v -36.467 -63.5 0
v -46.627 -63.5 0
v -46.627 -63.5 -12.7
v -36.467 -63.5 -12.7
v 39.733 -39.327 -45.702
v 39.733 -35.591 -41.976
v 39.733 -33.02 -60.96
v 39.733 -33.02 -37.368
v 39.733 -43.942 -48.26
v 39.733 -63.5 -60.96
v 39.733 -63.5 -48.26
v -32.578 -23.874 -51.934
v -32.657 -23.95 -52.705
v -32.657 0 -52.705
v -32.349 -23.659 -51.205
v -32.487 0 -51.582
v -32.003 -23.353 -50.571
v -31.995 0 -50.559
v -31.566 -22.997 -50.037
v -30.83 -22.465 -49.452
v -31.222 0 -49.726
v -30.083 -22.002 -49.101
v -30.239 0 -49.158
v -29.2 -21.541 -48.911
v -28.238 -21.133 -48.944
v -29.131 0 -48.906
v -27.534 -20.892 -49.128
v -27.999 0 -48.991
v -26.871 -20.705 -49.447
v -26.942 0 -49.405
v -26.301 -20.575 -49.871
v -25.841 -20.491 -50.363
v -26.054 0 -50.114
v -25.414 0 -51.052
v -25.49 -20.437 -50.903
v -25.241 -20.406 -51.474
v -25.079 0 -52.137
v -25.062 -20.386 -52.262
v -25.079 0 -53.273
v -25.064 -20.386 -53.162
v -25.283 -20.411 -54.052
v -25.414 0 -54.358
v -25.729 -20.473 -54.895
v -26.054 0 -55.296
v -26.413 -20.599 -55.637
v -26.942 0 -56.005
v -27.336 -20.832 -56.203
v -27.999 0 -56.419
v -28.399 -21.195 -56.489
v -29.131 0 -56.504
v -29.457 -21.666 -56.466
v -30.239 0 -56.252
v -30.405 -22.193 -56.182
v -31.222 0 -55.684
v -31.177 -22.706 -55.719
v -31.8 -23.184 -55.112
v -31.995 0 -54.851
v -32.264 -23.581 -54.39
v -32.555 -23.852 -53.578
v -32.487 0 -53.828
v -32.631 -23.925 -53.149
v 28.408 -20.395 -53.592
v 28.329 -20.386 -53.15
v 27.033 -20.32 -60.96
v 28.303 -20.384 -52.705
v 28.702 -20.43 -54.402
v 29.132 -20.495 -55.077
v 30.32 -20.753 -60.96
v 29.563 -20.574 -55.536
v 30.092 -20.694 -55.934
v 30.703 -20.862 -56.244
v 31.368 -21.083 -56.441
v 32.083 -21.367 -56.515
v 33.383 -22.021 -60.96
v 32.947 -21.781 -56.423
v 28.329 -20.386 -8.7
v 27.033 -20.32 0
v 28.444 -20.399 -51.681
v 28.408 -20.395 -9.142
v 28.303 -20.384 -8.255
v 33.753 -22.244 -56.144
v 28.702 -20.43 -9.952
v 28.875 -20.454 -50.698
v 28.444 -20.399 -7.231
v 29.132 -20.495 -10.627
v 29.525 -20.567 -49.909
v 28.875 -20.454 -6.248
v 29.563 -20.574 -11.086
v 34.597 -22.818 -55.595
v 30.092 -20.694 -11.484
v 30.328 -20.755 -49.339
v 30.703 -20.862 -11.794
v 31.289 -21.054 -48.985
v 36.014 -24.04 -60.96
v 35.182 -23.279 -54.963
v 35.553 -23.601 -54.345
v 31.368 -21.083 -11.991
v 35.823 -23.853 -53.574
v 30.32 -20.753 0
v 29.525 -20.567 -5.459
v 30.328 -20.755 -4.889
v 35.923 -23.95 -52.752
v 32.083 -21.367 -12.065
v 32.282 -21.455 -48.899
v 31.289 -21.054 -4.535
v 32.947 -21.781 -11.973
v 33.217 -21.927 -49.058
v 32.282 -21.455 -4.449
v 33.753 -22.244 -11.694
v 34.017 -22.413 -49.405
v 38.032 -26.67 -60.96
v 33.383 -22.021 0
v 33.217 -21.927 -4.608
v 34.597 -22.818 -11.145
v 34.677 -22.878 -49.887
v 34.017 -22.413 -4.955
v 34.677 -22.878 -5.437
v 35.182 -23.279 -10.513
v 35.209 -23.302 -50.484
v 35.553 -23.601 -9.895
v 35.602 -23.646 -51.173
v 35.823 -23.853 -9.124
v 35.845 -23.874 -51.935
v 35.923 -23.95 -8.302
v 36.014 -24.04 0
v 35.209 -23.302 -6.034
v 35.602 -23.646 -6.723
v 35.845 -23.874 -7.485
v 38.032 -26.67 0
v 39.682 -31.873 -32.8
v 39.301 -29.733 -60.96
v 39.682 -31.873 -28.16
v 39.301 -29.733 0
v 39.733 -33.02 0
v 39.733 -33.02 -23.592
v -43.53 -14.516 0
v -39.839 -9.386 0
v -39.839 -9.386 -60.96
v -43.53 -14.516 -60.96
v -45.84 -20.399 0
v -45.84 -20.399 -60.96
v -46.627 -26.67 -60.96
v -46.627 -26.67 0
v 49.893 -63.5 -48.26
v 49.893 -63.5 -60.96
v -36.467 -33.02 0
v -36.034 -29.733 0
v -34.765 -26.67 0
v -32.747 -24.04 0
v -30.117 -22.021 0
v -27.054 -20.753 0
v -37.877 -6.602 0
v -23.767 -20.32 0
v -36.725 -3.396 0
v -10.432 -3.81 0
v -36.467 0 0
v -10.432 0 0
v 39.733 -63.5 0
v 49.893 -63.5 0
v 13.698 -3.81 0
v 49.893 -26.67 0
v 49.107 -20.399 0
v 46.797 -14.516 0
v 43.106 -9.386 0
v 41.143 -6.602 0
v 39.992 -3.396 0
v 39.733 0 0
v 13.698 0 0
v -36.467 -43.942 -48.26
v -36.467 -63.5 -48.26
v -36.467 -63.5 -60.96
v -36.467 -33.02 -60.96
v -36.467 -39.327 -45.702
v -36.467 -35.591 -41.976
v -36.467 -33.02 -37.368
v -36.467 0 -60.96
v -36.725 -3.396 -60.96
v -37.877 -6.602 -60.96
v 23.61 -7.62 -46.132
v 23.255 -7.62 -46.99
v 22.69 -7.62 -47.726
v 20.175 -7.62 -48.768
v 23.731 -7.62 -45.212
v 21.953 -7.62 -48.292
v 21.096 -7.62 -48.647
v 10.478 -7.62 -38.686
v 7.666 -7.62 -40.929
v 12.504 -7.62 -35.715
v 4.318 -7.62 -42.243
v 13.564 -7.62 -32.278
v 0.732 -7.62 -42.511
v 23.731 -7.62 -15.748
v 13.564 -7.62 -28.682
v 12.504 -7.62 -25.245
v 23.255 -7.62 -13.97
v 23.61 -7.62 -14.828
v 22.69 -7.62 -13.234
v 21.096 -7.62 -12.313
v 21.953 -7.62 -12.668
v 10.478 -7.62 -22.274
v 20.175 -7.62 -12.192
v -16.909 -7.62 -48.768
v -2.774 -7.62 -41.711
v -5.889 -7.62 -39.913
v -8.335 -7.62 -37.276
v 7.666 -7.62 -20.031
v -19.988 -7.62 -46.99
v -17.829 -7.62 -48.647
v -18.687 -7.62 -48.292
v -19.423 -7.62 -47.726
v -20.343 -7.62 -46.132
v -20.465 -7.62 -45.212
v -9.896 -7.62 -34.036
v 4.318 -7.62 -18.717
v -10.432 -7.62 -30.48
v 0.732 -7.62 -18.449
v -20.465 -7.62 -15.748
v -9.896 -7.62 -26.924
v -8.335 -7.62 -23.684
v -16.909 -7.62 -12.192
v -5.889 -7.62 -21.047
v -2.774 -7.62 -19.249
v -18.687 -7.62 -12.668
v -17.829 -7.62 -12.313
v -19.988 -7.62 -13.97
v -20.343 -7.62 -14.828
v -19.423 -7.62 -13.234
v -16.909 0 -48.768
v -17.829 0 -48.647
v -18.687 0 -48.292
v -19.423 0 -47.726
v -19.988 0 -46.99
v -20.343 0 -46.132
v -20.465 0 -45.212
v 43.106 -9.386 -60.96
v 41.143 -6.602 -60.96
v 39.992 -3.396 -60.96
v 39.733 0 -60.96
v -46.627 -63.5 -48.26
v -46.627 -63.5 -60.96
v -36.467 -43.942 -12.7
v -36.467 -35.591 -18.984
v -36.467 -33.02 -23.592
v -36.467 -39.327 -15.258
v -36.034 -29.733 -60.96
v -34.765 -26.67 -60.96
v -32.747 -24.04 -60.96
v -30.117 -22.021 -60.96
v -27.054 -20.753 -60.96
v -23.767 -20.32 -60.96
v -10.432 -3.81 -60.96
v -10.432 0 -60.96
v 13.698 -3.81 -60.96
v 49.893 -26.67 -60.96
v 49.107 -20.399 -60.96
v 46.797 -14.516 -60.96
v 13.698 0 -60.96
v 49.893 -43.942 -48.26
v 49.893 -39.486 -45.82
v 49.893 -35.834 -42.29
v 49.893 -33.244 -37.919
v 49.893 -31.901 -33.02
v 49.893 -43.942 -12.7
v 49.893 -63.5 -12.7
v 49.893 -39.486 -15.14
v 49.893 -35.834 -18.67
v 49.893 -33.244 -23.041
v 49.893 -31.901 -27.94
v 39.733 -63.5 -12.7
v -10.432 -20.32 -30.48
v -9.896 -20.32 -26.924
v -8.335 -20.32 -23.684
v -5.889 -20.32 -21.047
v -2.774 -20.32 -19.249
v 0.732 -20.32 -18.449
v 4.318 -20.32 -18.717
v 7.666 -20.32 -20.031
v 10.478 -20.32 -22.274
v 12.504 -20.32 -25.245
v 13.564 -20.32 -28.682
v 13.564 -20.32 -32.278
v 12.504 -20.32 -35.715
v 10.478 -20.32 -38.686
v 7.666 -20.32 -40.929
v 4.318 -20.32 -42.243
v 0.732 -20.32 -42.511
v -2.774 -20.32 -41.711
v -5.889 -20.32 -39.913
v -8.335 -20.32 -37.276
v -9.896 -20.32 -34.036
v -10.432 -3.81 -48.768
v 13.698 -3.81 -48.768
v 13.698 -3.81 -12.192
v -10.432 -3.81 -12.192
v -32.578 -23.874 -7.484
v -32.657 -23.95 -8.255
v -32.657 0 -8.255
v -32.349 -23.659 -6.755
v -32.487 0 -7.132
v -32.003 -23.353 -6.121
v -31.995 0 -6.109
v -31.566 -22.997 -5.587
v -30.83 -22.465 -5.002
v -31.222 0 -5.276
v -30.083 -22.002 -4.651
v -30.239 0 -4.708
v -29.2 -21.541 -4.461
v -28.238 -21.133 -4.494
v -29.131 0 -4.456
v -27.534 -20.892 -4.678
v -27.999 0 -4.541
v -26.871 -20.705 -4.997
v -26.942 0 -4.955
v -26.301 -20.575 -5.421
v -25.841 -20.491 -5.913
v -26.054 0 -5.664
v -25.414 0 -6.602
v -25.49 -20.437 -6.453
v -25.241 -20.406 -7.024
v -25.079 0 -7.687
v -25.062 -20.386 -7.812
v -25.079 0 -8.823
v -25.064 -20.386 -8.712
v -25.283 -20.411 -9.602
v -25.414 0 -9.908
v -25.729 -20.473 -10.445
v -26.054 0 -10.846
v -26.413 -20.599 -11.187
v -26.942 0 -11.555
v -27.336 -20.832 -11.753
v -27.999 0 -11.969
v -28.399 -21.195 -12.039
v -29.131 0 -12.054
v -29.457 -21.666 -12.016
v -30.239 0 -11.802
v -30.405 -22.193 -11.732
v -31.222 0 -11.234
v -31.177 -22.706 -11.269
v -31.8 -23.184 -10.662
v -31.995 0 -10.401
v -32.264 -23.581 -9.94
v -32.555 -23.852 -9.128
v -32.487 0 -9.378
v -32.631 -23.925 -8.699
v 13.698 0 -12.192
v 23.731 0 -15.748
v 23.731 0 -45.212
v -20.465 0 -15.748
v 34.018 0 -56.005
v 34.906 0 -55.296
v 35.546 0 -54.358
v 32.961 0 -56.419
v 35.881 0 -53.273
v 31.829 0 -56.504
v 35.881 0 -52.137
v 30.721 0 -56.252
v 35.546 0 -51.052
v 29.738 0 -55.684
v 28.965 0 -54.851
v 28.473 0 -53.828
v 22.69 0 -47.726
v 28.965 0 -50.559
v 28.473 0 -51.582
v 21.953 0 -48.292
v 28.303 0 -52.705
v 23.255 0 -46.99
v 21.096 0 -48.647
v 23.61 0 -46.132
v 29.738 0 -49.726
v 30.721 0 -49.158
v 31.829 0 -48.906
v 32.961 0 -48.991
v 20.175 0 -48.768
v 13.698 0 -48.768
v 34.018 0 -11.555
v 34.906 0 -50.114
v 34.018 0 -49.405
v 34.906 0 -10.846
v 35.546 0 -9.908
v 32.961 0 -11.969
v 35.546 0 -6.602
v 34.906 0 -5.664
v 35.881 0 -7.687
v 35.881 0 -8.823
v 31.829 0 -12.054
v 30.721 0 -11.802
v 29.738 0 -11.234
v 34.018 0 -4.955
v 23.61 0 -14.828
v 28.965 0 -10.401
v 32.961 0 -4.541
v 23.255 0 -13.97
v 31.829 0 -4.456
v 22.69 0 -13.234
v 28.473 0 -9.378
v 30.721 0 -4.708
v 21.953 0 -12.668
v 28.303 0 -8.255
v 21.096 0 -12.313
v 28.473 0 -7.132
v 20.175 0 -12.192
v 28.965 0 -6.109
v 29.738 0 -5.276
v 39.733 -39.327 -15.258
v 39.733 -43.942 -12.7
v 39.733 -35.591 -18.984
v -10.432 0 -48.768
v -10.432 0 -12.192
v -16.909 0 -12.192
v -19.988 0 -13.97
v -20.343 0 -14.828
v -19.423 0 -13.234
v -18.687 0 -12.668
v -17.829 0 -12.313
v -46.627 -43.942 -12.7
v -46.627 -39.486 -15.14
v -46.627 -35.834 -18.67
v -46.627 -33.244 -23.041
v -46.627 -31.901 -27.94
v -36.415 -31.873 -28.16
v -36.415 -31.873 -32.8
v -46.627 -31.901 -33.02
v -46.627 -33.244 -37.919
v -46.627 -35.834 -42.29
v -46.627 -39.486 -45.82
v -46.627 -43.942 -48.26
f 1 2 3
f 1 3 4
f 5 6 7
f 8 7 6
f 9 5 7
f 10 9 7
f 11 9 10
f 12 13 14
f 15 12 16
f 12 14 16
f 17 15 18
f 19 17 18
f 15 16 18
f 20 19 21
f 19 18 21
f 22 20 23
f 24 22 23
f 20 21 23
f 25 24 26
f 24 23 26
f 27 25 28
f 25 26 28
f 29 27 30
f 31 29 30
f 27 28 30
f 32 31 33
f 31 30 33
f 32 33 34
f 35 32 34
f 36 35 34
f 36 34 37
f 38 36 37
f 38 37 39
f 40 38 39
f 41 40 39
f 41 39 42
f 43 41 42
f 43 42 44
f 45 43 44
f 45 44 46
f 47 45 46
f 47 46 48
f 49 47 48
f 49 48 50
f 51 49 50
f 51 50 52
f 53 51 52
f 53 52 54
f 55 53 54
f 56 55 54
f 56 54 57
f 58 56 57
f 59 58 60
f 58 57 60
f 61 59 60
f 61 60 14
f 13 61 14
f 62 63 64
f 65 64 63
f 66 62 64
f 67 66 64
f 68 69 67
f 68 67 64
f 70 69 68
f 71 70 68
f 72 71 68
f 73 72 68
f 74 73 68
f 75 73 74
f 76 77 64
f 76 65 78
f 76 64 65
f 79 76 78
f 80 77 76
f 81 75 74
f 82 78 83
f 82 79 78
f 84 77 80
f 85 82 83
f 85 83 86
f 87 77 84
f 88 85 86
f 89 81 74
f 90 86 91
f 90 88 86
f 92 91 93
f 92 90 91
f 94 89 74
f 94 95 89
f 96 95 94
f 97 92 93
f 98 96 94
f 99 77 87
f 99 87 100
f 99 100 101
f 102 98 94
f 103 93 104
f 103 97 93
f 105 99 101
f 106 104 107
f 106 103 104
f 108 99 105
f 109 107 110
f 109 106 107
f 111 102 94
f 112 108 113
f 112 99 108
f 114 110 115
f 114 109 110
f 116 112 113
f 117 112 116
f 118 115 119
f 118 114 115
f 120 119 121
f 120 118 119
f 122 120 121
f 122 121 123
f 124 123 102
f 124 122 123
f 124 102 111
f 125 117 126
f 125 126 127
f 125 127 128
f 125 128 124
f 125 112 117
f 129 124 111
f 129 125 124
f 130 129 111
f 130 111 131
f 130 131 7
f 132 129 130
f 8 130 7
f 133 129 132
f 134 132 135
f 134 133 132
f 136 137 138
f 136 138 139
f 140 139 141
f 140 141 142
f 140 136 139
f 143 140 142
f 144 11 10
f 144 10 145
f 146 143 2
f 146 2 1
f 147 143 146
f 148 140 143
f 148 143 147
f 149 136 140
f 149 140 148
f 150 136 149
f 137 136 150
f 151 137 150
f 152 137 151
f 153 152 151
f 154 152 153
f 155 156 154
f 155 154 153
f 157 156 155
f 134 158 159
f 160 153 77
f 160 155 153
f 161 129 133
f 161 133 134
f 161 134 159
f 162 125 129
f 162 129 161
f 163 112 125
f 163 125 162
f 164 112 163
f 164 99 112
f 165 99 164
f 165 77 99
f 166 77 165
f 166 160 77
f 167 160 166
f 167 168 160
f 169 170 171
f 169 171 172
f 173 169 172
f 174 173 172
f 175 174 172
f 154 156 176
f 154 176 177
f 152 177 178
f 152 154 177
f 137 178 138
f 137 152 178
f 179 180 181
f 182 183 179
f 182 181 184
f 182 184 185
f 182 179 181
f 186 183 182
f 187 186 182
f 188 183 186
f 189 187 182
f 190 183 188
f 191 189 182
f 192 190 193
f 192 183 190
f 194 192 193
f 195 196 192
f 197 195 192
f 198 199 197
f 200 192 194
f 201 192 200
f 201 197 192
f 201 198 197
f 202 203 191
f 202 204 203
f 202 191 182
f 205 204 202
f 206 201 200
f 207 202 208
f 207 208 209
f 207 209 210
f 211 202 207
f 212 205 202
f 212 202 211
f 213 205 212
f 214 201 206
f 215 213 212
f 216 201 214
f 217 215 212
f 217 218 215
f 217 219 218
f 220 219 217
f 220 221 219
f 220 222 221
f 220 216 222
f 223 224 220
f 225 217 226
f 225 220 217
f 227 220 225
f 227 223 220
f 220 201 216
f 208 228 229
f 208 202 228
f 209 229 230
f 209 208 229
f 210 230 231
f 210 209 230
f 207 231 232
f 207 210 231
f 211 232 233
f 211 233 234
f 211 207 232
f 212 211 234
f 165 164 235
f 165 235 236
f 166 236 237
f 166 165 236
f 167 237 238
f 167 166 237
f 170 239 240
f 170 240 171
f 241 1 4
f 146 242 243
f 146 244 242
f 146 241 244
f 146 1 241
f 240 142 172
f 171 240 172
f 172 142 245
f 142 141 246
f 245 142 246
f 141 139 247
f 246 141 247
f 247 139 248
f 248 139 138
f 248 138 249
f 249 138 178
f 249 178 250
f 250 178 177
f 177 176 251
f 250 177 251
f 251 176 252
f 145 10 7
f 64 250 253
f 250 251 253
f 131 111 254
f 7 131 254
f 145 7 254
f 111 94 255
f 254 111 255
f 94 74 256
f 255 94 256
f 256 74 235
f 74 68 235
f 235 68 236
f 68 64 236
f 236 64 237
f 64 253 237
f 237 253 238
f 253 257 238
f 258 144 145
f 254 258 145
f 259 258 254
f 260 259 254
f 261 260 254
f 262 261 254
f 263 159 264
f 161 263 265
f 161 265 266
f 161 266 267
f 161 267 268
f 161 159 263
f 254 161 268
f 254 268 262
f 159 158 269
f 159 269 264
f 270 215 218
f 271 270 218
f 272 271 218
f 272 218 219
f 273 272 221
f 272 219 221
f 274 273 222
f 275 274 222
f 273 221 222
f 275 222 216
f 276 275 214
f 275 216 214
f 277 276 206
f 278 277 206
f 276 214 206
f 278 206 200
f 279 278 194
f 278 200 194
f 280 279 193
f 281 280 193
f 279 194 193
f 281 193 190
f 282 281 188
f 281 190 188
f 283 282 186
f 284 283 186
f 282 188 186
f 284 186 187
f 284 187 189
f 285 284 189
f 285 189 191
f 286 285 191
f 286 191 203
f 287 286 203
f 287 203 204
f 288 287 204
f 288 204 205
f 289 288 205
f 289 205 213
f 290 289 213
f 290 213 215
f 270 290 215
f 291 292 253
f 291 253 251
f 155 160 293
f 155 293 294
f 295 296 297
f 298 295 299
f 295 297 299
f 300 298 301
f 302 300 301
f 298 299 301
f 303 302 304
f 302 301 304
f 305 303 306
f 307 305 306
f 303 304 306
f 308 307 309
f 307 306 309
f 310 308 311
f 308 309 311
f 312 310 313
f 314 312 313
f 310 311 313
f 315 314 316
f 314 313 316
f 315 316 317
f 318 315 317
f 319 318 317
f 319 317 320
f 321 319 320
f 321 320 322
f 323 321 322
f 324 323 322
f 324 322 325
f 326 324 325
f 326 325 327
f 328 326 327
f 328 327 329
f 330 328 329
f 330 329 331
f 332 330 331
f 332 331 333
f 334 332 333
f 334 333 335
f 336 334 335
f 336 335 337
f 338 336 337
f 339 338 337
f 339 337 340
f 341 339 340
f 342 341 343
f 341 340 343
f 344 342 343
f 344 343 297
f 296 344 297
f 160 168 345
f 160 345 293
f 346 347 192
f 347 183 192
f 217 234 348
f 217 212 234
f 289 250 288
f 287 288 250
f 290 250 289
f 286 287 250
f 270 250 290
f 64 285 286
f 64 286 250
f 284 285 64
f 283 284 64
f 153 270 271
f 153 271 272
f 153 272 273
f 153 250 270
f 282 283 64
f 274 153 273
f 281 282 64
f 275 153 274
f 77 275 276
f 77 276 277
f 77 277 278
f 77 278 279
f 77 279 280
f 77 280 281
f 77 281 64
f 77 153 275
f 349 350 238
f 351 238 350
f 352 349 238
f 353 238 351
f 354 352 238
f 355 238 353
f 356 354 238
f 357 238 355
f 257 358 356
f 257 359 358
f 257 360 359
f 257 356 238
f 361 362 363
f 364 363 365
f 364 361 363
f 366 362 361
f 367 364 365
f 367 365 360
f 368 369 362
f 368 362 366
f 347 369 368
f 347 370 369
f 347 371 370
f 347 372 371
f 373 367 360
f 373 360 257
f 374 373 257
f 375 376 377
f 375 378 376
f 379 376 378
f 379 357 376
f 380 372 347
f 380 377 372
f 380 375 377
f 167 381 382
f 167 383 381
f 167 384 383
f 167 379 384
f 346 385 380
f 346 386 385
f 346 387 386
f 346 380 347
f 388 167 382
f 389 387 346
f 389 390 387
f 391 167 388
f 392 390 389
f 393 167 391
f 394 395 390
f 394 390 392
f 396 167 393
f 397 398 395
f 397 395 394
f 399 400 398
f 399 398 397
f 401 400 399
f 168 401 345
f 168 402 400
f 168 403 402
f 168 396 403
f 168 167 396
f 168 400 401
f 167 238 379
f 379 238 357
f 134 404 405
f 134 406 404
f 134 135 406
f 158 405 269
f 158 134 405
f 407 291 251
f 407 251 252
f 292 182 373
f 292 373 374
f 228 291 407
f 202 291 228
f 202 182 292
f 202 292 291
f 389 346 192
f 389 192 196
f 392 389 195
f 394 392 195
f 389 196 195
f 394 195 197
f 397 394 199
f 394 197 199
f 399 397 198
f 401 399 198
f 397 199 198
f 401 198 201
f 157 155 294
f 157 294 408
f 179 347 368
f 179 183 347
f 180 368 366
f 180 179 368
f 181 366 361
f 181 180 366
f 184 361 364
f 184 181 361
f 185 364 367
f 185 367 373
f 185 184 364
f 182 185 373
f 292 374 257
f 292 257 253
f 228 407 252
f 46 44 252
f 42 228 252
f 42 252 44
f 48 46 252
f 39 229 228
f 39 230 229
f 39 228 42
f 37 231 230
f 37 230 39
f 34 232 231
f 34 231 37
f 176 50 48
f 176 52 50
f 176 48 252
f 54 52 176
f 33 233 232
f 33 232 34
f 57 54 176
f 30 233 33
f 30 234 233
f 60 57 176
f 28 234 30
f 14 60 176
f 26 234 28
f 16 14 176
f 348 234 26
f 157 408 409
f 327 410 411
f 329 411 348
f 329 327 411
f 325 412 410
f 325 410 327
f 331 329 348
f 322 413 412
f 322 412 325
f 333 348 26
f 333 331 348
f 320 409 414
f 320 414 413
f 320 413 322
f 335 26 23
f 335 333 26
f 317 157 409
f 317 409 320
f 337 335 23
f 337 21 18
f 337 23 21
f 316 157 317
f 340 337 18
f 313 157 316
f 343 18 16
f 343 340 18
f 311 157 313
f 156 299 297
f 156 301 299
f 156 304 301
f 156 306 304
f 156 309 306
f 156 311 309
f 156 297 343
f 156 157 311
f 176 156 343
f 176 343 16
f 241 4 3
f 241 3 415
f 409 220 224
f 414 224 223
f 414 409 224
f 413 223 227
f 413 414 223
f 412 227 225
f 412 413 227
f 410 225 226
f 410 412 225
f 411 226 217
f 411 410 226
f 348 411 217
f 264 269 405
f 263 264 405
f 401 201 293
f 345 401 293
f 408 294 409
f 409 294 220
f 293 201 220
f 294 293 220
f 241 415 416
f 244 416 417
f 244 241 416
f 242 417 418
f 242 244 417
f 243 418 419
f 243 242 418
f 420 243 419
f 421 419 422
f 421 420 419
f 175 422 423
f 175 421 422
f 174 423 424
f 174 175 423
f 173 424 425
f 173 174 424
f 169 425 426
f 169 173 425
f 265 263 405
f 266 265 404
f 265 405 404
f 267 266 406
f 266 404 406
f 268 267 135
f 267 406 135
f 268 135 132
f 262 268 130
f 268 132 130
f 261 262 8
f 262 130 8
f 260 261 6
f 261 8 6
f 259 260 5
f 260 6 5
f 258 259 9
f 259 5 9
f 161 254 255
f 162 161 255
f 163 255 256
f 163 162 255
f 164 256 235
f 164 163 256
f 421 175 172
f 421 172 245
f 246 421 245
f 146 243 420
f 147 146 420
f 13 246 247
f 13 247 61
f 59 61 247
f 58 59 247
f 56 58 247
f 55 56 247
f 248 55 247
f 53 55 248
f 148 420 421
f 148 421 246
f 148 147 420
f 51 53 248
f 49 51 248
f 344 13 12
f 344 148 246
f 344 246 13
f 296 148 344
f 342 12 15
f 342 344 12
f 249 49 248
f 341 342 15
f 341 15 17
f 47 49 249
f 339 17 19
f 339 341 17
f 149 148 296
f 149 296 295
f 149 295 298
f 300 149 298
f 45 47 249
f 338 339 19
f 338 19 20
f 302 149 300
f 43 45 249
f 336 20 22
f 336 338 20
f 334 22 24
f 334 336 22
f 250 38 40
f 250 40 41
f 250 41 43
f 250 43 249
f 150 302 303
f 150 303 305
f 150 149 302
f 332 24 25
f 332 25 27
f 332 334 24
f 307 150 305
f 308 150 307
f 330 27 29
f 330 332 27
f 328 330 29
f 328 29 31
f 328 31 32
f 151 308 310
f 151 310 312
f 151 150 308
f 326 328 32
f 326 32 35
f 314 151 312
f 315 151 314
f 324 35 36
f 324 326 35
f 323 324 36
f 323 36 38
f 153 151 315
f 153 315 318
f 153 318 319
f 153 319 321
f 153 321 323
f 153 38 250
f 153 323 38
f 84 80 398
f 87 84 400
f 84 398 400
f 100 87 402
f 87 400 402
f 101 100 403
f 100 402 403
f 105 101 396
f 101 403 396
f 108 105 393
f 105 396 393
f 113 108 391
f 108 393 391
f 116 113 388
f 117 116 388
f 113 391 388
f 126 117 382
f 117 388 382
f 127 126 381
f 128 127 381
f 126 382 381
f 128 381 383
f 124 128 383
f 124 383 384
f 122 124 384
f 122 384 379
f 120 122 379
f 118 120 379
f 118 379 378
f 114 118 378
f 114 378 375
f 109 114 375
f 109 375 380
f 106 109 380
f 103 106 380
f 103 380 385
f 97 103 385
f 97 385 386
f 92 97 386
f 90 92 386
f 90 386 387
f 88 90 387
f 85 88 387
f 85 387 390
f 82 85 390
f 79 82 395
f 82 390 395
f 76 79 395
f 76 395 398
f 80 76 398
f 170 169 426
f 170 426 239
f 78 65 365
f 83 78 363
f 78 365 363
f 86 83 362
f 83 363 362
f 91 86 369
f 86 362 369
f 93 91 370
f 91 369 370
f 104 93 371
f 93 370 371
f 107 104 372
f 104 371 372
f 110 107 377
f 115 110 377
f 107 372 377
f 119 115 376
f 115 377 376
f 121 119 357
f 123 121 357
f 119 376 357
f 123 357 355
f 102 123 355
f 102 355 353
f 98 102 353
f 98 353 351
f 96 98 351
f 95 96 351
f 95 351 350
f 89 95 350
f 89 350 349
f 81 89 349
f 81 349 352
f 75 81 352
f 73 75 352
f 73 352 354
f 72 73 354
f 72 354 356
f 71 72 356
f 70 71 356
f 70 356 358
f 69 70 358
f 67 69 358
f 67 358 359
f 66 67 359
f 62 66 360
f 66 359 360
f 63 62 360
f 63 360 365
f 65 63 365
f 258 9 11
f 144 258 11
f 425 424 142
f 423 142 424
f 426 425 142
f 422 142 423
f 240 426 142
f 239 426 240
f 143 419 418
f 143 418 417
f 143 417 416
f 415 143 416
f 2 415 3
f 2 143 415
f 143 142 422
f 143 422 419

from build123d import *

# Parameters (mm, degrees)
EXTRUDE1_DEPTH          = 60.96
CUT_EXTRUDE1_DEPTH      = 50.893408892
CUT_EXTRUDE1_DEPTH_BACK = 47.626591108
SKETCH5_W               = 44.196
SKETCH5_H               = 36.576
CUT_EXTRUDE3_DEPTH      = 3.81
CUT_EXTRUDE3_DEPTH_BACK = 3.81
FILLET1_R               = 3.556
FILLET2_R               = 3.556
SKETCH6_R               = 12.065
CUT_EXTRUDE4_DEPTH      = 56.88
SKETCH7_R               = 3.81
CUT_EXTRUDE5_DEPTH      = 64.5
LPATTERN1_COUNT         = 2
LPATTERN1_PITCH         = 60.96
LPATTERN1_COUNT_DIR2    = 2
LPATTERN1_PITCH_DIR2    = 44.45


with BuildPart() as part:
    # Sketch1 → Extrude1 (new body)
    with BuildSketch(Plane.XY):
        with BuildLine():
            Line((-4.519970737, -20.32), (7.786788522, -20.32))
            Line((7.786788522, -20.32), (27.033408892, -20.32))
            ThreePointArc((27.033408892, -20.32), (36.013665013, -24.039743879), (39.733408892, -33.02))
            Line((39.733408892, -33.02), (39.733408892, -63.5))
            Line((39.733408892, -63.5), (49.893408892, -63.5))
            Line((49.893408892, -63.5), (49.893408892, -26.67))
            ThreePointArc((49.893408892, -26.67), (48.135622025, -17.385294394), (43.105553917, -9.385670173))
            ThreePointArc((43.105553917, -9.385670173), (40.459641097, -5.037692796), (39.733408892, 0))
            Line((39.733408892, 0), (13.698408892, 0))
            Line((13.698408892, 0), (13.698408892, -3.81))
            Line((13.698408892, -3.81), (-10.431591108, -3.81))
            Line((-10.431591108, -3.81), (-10.431591108, 0))
            Line((-10.431591108, 0), (-36.466591108, 0))
            ThreePointArc((-36.466591108, 0), (-37.192823312, -5.037692796), (-39.838736133, -9.385670173))
            ThreePointArc((-39.838736133, -9.385670173), (-44.868804241, -17.385294394), (-46.626591108, -26.67))
            Line((-46.626591108, -26.67), (-46.626591108, -63.5))
            Line((-46.626591108, -63.5), (-36.466591108, -63.5))
            Line((-36.466591108, -63.5), (-36.466591108, -33.02))
            ThreePointArc((-36.466591108, -33.02), (-32.746847229, -24.039743879), (-23.766591108, -20.32))
            Line((-23.766591108, -20.32), (-4.519970737, -20.32))
        make_face()
    extrude(amount=-EXTRUDE1_DEPTH)

    # Sketch4 → Cut-Extrude1 (cut, two sides)
    with BuildSketch(Plane(origin=(0, 0, 0), x_dir=(0, 0, -1), z_dir=(1, 0, 0))) as cut_extrude1_sk:
        with BuildLine():
            Line((12.7, -233.015235636), (12.7, -63.5))
            Line((12.7, -63.5), (12.7, -43.942))
            ThreePointArc((12.7, -43.942), (30.48, -31.731159305), (48.26, -43.942))
            Line((48.26, -43.942), (48.26, -63.5))
            Line((48.26, -63.5), (48.26, -233.015235636))
            Line((48.26, -233.015235636), (48.26, -572.045706908))
            Line((48.26, -572.045706908), (12.7, -572.045706908))
            Line((12.7, -572.045706908), (12.7, -233.015235636))
        make_face()
    extrude(amount=CUT_EXTRUDE1_DEPTH, mode=Mode.SUBTRACT)
    extrude(cut_extrude1_sk.sketch, amount=-CUT_EXTRUDE1_DEPTH_BACK, mode=Mode.SUBTRACT)

    # Sketch5 → Cut-Extrude3 (cut, two sides)
    with BuildSketch(Plane(origin=(0, -3.81, 0), x_dir=(-1, 0, 0), z_dir=(0, 1, 0))) as cut_extrude3_sk:
        with Locations((-1.633408892, -30.48)):
            Rectangle(SKETCH5_W, SKETCH5_H)
    extrude(amount=CUT_EXTRUDE3_DEPTH, mode=Mode.SUBTRACT)
    extrude(cut_extrude3_sk.sketch, amount=-CUT_EXTRUDE3_DEPTH_BACK, mode=Mode.SUBTRACT)

    # Fillet1
    fillet1_edges = [part.edges().sort_by_distance(p)[0] for p in [
        (23.731408892, -3.81, -12.192),
    ]]
    fillet(fillet1_edges, radius=FILLET1_R)

    # Fillet2
    fillet2_edges = [part.edges().sort_by_distance(p)[0] for p in [
        (23.731408892, -3.81, -48.768),
        (-20.464591108, -3.81, -12.192),
        (-20.464591108, -3.81, -48.768),
    ]]
    fillet(fillet2_edges, radius=FILLET2_R)

    # Sketch6 → Cut-Extrude4 (cut, through all)
    with BuildSketch(Plane(origin=(0, -7.62, 0), x_dir=(-1, 0, 0), z_dir=(0, 1, 0))):
        with Locations((-1.633408892, -30.48)):
            Circle(SKETCH6_R)
    extrude(amount=-CUT_EXTRUDE4_DEPTH, mode=Mode.SUBTRACT)

    # Sketch7 → Cut-Extrude5 (cut, through all)
    with BuildSketch(Plane(origin=(0, 0, 0), x_dir=(-1, 0, 0), z_dir=(0, 1, 0))):
        with Locations((-32.113408892, -8.255)):
            Circle(SKETCH7_R)
    cut_extrude5 = extrude(amount=-CUT_EXTRUDE5_DEPTH, mode=Mode.SUBTRACT)

    # LPattern1: Cut-Extrude5 2 × 2
    with Locations(*[(-i * LPATTERN1_PITCH, 0, -j * LPATTERN1_PITCH_DIR2) for i in range(LPATTERN1_COUNT) for j in range(LPATTERN1_COUNT_DIR2) if (i, j) != (0, 0)]):
        add(cut_extrude5, mode=Mode.SUBTRACT)


solid = part.part
